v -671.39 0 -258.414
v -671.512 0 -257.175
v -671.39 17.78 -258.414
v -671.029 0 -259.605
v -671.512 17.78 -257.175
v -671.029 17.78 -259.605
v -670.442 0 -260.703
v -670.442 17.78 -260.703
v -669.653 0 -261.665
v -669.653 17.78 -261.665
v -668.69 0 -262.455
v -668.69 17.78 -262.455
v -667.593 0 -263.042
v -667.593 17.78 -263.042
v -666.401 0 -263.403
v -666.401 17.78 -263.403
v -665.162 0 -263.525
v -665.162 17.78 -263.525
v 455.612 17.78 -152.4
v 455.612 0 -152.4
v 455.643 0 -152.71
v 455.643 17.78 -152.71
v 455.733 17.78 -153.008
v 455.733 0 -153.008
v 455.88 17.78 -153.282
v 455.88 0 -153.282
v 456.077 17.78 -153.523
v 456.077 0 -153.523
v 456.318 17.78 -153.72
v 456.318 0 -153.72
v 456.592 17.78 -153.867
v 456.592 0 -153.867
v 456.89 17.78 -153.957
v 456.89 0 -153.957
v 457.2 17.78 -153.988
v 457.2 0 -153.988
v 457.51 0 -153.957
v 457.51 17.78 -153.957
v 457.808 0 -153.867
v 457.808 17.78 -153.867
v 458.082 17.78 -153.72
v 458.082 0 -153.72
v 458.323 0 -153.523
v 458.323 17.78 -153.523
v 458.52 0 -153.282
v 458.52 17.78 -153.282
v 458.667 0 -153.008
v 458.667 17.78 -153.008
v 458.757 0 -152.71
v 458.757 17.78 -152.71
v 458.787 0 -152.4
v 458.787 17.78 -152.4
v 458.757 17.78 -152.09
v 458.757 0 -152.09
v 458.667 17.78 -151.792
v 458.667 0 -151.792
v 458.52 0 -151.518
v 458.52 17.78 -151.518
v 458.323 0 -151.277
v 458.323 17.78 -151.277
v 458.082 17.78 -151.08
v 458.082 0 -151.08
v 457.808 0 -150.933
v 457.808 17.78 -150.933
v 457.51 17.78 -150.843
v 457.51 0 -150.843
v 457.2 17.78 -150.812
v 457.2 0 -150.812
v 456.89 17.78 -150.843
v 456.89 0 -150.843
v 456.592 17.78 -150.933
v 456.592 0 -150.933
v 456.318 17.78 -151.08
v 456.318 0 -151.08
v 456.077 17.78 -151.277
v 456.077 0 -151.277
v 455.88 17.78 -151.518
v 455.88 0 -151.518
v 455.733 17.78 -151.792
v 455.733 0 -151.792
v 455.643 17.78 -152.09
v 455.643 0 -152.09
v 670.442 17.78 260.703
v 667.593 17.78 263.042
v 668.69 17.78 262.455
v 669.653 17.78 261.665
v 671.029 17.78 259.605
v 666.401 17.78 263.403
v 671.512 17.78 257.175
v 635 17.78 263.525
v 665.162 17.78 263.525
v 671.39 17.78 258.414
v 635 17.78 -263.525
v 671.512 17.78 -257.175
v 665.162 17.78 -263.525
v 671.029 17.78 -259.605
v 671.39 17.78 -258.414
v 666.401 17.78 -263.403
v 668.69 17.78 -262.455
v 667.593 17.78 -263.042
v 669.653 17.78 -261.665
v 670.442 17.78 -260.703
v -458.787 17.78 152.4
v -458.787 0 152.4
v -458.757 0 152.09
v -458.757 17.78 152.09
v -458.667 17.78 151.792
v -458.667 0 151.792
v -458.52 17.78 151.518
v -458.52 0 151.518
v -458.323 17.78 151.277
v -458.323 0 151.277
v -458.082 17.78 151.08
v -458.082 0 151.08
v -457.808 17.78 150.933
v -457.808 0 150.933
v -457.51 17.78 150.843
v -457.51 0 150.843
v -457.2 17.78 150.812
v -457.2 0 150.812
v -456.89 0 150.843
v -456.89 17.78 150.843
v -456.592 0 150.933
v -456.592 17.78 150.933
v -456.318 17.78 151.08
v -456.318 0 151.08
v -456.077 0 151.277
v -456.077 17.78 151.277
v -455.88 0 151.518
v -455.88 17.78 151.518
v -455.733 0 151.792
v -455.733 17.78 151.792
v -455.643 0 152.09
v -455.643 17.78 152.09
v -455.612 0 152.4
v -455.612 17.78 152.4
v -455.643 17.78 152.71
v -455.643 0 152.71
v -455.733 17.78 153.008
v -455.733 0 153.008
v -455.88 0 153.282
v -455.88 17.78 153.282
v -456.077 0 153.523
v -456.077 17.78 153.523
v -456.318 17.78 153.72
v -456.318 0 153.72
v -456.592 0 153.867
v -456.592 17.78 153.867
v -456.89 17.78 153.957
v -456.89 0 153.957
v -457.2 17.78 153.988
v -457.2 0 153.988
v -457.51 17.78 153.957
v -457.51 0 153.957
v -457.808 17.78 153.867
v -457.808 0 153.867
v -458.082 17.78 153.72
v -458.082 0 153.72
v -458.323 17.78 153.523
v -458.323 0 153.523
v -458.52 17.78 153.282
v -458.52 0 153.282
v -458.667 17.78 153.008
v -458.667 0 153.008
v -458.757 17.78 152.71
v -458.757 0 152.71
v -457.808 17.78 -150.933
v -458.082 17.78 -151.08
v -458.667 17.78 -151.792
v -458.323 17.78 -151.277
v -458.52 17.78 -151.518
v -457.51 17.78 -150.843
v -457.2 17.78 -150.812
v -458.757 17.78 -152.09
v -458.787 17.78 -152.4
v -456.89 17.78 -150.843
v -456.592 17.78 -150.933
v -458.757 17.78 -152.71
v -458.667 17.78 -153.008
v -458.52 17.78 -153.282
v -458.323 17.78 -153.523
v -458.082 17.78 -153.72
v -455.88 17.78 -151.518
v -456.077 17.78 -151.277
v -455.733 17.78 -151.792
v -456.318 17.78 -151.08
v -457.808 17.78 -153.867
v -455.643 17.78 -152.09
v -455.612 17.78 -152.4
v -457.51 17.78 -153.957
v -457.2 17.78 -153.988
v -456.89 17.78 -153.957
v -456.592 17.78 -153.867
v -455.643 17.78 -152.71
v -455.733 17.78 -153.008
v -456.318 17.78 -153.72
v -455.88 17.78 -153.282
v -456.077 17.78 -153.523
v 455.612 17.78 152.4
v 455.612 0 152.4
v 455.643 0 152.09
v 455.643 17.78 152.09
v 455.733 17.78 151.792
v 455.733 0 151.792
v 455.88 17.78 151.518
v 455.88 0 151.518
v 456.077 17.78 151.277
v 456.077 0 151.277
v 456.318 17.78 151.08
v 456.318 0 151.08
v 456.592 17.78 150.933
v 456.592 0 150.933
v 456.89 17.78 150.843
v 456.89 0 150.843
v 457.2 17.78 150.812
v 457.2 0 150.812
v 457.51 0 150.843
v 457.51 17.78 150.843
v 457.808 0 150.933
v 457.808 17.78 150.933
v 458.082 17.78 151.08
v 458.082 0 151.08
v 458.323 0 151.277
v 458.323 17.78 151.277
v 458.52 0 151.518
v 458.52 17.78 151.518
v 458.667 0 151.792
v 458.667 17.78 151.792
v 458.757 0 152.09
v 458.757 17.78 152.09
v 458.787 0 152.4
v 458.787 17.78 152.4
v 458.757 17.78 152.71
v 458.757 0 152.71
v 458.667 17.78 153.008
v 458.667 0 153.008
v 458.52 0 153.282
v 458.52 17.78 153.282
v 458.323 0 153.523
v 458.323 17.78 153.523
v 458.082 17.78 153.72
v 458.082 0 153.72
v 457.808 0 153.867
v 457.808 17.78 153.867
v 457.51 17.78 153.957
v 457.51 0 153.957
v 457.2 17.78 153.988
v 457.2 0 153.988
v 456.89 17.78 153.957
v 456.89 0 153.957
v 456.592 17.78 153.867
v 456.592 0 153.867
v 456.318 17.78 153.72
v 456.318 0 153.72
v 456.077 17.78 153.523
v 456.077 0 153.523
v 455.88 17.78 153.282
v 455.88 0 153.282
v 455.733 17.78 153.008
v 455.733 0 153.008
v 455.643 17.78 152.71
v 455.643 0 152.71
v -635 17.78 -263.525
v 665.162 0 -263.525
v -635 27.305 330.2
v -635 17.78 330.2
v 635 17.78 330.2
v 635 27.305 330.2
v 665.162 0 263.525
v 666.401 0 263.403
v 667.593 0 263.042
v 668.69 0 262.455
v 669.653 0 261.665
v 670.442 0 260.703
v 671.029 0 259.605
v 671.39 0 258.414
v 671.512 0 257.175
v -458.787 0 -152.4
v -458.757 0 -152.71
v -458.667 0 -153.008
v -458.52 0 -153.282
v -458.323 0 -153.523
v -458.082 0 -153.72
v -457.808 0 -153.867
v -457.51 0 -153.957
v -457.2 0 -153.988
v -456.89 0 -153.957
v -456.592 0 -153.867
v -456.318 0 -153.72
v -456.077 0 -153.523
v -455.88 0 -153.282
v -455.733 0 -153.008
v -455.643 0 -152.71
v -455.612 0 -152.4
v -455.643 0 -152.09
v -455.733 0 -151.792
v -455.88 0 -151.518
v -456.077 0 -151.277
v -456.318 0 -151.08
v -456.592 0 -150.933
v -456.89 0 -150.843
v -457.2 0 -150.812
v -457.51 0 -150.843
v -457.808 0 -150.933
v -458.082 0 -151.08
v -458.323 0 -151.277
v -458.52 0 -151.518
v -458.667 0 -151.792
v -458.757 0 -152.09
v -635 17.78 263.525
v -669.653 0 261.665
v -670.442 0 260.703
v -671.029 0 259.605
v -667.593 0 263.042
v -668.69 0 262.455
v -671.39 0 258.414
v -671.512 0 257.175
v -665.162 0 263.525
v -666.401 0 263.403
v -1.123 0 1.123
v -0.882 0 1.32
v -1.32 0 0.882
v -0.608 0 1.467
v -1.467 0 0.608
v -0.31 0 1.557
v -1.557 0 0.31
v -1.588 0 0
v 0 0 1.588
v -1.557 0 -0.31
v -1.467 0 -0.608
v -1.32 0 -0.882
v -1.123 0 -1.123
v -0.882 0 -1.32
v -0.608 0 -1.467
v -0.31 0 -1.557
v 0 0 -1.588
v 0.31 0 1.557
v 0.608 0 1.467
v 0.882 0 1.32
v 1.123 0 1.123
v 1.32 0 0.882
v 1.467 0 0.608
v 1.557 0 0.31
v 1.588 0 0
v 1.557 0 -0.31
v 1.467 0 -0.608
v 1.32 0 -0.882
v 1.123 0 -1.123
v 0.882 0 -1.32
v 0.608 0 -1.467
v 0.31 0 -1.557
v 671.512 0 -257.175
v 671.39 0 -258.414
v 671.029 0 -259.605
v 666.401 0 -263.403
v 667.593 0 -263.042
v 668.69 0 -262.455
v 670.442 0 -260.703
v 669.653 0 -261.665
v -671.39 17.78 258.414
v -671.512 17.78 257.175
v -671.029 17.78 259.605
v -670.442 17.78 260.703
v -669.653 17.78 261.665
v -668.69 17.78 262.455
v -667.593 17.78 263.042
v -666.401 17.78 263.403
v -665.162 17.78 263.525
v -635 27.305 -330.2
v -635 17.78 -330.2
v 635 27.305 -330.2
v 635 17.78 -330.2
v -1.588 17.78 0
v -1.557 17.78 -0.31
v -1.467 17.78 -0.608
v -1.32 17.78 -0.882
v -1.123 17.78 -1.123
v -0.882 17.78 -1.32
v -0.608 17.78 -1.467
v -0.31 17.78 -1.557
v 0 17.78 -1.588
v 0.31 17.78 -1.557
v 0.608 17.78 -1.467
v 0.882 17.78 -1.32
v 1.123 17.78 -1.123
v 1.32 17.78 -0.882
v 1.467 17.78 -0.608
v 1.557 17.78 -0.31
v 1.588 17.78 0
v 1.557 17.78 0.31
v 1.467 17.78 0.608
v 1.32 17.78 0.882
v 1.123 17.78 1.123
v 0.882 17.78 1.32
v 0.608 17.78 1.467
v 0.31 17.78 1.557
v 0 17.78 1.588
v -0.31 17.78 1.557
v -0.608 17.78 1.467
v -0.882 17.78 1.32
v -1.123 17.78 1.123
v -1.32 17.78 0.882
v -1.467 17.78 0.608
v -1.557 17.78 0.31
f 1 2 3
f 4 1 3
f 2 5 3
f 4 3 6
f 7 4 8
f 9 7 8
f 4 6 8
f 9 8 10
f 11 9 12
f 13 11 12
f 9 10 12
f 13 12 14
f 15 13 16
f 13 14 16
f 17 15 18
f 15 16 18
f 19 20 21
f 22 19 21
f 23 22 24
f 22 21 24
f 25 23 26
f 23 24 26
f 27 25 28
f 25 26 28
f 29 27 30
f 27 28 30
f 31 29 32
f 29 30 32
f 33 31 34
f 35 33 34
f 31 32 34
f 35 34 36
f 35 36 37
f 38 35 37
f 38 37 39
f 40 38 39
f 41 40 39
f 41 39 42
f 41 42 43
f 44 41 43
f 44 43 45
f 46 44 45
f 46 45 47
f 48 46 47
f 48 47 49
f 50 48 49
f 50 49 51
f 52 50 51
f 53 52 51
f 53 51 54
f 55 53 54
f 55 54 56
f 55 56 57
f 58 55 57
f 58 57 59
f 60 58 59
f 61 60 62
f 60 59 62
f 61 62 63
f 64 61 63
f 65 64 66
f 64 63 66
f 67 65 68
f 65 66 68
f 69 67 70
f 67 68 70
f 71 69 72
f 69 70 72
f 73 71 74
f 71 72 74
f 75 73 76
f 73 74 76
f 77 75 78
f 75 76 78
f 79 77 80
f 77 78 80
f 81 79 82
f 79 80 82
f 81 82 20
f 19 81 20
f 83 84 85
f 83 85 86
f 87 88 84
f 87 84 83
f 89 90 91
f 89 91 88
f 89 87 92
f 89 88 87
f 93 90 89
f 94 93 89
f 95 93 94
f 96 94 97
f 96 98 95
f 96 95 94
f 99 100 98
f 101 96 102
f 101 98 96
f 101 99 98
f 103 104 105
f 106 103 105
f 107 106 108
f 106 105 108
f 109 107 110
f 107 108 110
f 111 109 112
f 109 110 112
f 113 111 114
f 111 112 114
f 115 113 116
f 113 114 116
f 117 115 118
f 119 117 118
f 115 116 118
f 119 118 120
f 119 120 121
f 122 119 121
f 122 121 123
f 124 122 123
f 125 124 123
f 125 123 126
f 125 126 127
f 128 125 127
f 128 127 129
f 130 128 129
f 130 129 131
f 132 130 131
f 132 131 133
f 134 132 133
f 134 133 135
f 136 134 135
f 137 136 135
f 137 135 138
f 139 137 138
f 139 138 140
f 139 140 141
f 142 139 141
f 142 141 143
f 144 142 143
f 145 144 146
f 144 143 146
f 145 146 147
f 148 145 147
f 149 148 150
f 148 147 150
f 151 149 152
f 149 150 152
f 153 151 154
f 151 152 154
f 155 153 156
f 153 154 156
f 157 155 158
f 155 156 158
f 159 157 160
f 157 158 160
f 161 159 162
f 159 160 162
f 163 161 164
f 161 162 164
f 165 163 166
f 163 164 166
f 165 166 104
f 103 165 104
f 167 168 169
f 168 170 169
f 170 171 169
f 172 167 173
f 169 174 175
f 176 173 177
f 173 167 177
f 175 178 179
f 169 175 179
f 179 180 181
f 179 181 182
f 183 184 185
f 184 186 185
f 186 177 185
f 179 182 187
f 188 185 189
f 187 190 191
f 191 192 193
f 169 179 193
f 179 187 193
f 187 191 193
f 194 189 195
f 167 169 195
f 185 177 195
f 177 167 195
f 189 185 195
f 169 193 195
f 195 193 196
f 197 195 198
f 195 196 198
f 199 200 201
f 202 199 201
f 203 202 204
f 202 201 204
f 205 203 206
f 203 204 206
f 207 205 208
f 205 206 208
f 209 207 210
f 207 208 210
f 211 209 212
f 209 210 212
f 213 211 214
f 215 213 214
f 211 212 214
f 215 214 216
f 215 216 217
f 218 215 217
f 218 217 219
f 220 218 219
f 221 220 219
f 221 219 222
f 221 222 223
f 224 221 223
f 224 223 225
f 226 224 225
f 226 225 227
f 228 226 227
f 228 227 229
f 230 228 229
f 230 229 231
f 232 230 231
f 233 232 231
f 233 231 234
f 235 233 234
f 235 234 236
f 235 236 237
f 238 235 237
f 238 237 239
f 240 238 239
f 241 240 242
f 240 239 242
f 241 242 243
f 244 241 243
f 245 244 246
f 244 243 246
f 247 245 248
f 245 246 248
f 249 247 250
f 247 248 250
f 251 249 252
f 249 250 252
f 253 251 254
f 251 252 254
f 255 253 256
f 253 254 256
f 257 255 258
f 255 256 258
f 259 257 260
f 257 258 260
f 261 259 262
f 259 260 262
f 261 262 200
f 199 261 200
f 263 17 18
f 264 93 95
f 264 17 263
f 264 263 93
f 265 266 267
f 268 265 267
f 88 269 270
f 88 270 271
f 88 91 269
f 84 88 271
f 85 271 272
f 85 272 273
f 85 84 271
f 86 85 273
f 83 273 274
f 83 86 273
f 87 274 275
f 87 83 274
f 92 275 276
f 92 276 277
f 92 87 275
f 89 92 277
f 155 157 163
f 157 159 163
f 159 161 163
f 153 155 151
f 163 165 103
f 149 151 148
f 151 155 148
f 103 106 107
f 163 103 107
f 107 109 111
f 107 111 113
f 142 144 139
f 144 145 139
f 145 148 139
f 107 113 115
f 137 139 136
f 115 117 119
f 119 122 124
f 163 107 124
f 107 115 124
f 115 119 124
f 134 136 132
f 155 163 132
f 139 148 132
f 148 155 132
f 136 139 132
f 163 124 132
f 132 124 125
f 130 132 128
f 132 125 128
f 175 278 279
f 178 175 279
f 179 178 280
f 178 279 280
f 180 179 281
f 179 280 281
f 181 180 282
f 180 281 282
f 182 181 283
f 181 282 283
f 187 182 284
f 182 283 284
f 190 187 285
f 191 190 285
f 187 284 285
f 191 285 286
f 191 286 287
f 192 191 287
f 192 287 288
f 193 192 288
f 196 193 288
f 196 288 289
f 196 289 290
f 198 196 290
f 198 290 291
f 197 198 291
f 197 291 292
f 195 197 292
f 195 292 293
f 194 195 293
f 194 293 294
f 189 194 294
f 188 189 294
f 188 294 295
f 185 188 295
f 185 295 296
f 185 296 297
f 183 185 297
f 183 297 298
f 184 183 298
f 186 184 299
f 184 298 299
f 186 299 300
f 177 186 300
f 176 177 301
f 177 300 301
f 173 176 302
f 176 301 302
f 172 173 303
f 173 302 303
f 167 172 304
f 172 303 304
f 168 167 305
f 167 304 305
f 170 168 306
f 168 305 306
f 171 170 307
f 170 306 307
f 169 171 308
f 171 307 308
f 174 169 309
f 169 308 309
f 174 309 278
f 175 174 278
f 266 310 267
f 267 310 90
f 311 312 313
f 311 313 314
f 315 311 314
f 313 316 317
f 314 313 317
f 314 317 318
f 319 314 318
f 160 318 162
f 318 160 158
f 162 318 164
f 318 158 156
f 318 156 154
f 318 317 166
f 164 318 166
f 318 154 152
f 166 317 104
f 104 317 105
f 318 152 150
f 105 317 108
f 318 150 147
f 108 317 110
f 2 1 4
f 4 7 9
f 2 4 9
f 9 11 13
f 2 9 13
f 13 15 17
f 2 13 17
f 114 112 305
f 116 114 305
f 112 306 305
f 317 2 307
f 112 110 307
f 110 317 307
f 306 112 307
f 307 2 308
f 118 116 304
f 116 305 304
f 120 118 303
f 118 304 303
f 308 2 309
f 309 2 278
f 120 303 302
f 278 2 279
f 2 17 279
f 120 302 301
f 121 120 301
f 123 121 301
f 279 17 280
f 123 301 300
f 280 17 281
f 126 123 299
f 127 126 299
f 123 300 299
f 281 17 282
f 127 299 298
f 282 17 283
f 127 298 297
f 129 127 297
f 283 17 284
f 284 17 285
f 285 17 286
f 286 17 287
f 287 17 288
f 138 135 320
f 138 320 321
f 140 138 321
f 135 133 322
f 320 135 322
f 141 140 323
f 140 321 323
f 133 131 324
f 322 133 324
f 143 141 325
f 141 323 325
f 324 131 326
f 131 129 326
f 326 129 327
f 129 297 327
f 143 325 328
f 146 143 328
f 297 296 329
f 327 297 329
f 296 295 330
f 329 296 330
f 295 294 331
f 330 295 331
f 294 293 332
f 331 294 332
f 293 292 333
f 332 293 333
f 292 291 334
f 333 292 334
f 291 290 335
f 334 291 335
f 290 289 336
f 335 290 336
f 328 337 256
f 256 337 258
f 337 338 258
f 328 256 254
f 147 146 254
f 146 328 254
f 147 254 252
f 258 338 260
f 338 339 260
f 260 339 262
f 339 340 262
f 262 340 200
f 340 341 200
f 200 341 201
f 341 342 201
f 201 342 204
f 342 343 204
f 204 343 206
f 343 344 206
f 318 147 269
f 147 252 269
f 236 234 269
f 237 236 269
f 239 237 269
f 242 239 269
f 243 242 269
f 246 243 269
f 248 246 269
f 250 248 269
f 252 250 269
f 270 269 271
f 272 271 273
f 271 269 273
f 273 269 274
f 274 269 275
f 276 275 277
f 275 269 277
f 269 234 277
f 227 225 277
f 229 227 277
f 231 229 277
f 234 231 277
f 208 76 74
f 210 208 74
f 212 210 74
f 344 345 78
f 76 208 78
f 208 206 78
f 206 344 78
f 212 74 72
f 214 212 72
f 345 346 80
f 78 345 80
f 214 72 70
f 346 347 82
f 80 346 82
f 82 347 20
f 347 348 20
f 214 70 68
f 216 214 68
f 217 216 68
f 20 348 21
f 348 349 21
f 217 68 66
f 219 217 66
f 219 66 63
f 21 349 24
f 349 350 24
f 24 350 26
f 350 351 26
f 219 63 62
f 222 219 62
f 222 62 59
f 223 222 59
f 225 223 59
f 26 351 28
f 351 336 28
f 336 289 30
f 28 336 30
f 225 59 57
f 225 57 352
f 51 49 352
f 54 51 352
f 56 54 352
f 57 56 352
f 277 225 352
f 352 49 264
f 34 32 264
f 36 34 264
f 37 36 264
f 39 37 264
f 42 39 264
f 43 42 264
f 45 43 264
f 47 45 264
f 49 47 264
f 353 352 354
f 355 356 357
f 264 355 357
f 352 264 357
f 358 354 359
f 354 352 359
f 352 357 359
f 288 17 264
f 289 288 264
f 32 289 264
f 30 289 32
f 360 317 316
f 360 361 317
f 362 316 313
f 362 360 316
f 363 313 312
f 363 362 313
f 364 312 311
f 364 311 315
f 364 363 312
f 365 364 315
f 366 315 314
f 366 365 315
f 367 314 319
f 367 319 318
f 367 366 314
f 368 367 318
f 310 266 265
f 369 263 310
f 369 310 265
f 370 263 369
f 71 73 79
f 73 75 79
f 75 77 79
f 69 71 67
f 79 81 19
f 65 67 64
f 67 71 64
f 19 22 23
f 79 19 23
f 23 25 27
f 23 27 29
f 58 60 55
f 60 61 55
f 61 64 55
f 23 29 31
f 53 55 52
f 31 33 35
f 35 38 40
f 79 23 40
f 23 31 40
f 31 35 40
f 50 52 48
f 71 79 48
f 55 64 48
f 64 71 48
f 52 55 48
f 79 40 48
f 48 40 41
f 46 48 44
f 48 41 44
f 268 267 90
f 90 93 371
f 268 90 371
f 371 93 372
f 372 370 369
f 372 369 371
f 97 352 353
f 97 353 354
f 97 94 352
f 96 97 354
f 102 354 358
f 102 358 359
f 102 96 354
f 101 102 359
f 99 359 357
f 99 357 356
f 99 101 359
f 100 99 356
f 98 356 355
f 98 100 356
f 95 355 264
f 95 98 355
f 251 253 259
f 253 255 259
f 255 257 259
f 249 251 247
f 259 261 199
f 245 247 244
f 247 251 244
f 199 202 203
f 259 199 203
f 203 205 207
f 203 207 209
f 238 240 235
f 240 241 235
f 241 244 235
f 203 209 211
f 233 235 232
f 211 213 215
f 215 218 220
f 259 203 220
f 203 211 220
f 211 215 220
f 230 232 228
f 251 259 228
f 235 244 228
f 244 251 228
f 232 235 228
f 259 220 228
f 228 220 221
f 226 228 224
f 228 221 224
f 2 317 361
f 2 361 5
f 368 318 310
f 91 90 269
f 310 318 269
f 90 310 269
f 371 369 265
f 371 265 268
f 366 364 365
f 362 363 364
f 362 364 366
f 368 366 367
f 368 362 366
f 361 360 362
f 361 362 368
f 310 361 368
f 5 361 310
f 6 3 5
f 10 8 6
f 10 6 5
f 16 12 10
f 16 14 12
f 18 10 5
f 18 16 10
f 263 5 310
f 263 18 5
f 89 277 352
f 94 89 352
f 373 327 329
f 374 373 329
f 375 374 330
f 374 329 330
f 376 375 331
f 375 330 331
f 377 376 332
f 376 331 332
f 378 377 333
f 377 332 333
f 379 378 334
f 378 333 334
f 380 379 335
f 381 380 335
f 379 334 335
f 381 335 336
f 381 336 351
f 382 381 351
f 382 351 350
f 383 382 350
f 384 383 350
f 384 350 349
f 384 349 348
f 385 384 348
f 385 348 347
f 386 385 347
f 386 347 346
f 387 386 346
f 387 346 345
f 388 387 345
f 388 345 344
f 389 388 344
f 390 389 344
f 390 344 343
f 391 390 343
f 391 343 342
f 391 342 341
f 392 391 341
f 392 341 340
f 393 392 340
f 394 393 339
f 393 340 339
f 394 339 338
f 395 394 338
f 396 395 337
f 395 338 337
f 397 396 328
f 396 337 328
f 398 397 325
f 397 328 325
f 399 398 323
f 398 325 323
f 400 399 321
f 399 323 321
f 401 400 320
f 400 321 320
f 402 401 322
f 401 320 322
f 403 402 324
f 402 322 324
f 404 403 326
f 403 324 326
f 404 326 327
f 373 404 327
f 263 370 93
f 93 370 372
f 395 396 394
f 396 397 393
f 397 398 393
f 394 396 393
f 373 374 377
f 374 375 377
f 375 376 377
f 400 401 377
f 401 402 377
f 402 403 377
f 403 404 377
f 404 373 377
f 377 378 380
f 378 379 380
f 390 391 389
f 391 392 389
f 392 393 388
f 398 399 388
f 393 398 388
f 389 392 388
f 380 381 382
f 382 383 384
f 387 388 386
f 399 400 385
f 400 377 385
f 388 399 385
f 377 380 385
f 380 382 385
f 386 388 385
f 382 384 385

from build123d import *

# Parameters (mm, degrees)
SKETCH1_W                    = 1343.025
SKETCH1_H                    = 527.05
BOSS_EXTRUDE1_DEPTH          = 17.78
FILLET1_R                    = 6.35
F_1_8_0_125_DIAMETER_HOLE1_D = 3.175
SKETCH2_W                    = 1270
SKETCH2_H                    = 660.4
BOSS_EXTRUDE2_DEPTH          = 9.525


with BuildPart() as part:
    # Sketch1 → Boss-Extrude1 (new body)
    with BuildSketch(Plane(origin=(0, 0, 0), x_dir=(1, 0, 0), z_dir=(0, 1, 0))):
        Rectangle(SKETCH1_W, SKETCH1_H)
    extrude(amount=BOSS_EXTRUDE1_DEPTH)

    # Fillet1
    fillet1_edges = [part.edges().sort_by_distance(p)[0] for p in [
        (671.5125, 8.89, 263.525),
        (-671.5125, 8.89, 263.525),
        (-671.5125, 8.89, -263.525),
        (671.5125, 8.89, -263.525),
    ]]
    fillet(fillet1_edges, radius=FILLET1_R)

    # 1/8 (0.125) Diameter Hole1 (through all)
    with Locations(Plane(origin=(0, 17.78, 0), x_dir=(1, 0, 0), z_dir=(0, 1, 0))):
        with Locations((0, 0), (457.2, 152.4), (-457.2, -152.4), (-457.2, 152.4), (457.2, -152.4)):
            Hole(F_1_8_0_125_DIAMETER_HOLE1_D / 2)

    # Sketch2 → Boss-Extrude2 (add)
    with BuildSketch(Plane(origin=(0, 17.78, 0), x_dir=(1, 0, 0), z_dir=(0, 1, 0))):
        Rectangle(SKETCH2_W, SKETCH2_H)
    extrude(amount=BOSS_EXTRUDE2_DEPTH)


solid = part.part
